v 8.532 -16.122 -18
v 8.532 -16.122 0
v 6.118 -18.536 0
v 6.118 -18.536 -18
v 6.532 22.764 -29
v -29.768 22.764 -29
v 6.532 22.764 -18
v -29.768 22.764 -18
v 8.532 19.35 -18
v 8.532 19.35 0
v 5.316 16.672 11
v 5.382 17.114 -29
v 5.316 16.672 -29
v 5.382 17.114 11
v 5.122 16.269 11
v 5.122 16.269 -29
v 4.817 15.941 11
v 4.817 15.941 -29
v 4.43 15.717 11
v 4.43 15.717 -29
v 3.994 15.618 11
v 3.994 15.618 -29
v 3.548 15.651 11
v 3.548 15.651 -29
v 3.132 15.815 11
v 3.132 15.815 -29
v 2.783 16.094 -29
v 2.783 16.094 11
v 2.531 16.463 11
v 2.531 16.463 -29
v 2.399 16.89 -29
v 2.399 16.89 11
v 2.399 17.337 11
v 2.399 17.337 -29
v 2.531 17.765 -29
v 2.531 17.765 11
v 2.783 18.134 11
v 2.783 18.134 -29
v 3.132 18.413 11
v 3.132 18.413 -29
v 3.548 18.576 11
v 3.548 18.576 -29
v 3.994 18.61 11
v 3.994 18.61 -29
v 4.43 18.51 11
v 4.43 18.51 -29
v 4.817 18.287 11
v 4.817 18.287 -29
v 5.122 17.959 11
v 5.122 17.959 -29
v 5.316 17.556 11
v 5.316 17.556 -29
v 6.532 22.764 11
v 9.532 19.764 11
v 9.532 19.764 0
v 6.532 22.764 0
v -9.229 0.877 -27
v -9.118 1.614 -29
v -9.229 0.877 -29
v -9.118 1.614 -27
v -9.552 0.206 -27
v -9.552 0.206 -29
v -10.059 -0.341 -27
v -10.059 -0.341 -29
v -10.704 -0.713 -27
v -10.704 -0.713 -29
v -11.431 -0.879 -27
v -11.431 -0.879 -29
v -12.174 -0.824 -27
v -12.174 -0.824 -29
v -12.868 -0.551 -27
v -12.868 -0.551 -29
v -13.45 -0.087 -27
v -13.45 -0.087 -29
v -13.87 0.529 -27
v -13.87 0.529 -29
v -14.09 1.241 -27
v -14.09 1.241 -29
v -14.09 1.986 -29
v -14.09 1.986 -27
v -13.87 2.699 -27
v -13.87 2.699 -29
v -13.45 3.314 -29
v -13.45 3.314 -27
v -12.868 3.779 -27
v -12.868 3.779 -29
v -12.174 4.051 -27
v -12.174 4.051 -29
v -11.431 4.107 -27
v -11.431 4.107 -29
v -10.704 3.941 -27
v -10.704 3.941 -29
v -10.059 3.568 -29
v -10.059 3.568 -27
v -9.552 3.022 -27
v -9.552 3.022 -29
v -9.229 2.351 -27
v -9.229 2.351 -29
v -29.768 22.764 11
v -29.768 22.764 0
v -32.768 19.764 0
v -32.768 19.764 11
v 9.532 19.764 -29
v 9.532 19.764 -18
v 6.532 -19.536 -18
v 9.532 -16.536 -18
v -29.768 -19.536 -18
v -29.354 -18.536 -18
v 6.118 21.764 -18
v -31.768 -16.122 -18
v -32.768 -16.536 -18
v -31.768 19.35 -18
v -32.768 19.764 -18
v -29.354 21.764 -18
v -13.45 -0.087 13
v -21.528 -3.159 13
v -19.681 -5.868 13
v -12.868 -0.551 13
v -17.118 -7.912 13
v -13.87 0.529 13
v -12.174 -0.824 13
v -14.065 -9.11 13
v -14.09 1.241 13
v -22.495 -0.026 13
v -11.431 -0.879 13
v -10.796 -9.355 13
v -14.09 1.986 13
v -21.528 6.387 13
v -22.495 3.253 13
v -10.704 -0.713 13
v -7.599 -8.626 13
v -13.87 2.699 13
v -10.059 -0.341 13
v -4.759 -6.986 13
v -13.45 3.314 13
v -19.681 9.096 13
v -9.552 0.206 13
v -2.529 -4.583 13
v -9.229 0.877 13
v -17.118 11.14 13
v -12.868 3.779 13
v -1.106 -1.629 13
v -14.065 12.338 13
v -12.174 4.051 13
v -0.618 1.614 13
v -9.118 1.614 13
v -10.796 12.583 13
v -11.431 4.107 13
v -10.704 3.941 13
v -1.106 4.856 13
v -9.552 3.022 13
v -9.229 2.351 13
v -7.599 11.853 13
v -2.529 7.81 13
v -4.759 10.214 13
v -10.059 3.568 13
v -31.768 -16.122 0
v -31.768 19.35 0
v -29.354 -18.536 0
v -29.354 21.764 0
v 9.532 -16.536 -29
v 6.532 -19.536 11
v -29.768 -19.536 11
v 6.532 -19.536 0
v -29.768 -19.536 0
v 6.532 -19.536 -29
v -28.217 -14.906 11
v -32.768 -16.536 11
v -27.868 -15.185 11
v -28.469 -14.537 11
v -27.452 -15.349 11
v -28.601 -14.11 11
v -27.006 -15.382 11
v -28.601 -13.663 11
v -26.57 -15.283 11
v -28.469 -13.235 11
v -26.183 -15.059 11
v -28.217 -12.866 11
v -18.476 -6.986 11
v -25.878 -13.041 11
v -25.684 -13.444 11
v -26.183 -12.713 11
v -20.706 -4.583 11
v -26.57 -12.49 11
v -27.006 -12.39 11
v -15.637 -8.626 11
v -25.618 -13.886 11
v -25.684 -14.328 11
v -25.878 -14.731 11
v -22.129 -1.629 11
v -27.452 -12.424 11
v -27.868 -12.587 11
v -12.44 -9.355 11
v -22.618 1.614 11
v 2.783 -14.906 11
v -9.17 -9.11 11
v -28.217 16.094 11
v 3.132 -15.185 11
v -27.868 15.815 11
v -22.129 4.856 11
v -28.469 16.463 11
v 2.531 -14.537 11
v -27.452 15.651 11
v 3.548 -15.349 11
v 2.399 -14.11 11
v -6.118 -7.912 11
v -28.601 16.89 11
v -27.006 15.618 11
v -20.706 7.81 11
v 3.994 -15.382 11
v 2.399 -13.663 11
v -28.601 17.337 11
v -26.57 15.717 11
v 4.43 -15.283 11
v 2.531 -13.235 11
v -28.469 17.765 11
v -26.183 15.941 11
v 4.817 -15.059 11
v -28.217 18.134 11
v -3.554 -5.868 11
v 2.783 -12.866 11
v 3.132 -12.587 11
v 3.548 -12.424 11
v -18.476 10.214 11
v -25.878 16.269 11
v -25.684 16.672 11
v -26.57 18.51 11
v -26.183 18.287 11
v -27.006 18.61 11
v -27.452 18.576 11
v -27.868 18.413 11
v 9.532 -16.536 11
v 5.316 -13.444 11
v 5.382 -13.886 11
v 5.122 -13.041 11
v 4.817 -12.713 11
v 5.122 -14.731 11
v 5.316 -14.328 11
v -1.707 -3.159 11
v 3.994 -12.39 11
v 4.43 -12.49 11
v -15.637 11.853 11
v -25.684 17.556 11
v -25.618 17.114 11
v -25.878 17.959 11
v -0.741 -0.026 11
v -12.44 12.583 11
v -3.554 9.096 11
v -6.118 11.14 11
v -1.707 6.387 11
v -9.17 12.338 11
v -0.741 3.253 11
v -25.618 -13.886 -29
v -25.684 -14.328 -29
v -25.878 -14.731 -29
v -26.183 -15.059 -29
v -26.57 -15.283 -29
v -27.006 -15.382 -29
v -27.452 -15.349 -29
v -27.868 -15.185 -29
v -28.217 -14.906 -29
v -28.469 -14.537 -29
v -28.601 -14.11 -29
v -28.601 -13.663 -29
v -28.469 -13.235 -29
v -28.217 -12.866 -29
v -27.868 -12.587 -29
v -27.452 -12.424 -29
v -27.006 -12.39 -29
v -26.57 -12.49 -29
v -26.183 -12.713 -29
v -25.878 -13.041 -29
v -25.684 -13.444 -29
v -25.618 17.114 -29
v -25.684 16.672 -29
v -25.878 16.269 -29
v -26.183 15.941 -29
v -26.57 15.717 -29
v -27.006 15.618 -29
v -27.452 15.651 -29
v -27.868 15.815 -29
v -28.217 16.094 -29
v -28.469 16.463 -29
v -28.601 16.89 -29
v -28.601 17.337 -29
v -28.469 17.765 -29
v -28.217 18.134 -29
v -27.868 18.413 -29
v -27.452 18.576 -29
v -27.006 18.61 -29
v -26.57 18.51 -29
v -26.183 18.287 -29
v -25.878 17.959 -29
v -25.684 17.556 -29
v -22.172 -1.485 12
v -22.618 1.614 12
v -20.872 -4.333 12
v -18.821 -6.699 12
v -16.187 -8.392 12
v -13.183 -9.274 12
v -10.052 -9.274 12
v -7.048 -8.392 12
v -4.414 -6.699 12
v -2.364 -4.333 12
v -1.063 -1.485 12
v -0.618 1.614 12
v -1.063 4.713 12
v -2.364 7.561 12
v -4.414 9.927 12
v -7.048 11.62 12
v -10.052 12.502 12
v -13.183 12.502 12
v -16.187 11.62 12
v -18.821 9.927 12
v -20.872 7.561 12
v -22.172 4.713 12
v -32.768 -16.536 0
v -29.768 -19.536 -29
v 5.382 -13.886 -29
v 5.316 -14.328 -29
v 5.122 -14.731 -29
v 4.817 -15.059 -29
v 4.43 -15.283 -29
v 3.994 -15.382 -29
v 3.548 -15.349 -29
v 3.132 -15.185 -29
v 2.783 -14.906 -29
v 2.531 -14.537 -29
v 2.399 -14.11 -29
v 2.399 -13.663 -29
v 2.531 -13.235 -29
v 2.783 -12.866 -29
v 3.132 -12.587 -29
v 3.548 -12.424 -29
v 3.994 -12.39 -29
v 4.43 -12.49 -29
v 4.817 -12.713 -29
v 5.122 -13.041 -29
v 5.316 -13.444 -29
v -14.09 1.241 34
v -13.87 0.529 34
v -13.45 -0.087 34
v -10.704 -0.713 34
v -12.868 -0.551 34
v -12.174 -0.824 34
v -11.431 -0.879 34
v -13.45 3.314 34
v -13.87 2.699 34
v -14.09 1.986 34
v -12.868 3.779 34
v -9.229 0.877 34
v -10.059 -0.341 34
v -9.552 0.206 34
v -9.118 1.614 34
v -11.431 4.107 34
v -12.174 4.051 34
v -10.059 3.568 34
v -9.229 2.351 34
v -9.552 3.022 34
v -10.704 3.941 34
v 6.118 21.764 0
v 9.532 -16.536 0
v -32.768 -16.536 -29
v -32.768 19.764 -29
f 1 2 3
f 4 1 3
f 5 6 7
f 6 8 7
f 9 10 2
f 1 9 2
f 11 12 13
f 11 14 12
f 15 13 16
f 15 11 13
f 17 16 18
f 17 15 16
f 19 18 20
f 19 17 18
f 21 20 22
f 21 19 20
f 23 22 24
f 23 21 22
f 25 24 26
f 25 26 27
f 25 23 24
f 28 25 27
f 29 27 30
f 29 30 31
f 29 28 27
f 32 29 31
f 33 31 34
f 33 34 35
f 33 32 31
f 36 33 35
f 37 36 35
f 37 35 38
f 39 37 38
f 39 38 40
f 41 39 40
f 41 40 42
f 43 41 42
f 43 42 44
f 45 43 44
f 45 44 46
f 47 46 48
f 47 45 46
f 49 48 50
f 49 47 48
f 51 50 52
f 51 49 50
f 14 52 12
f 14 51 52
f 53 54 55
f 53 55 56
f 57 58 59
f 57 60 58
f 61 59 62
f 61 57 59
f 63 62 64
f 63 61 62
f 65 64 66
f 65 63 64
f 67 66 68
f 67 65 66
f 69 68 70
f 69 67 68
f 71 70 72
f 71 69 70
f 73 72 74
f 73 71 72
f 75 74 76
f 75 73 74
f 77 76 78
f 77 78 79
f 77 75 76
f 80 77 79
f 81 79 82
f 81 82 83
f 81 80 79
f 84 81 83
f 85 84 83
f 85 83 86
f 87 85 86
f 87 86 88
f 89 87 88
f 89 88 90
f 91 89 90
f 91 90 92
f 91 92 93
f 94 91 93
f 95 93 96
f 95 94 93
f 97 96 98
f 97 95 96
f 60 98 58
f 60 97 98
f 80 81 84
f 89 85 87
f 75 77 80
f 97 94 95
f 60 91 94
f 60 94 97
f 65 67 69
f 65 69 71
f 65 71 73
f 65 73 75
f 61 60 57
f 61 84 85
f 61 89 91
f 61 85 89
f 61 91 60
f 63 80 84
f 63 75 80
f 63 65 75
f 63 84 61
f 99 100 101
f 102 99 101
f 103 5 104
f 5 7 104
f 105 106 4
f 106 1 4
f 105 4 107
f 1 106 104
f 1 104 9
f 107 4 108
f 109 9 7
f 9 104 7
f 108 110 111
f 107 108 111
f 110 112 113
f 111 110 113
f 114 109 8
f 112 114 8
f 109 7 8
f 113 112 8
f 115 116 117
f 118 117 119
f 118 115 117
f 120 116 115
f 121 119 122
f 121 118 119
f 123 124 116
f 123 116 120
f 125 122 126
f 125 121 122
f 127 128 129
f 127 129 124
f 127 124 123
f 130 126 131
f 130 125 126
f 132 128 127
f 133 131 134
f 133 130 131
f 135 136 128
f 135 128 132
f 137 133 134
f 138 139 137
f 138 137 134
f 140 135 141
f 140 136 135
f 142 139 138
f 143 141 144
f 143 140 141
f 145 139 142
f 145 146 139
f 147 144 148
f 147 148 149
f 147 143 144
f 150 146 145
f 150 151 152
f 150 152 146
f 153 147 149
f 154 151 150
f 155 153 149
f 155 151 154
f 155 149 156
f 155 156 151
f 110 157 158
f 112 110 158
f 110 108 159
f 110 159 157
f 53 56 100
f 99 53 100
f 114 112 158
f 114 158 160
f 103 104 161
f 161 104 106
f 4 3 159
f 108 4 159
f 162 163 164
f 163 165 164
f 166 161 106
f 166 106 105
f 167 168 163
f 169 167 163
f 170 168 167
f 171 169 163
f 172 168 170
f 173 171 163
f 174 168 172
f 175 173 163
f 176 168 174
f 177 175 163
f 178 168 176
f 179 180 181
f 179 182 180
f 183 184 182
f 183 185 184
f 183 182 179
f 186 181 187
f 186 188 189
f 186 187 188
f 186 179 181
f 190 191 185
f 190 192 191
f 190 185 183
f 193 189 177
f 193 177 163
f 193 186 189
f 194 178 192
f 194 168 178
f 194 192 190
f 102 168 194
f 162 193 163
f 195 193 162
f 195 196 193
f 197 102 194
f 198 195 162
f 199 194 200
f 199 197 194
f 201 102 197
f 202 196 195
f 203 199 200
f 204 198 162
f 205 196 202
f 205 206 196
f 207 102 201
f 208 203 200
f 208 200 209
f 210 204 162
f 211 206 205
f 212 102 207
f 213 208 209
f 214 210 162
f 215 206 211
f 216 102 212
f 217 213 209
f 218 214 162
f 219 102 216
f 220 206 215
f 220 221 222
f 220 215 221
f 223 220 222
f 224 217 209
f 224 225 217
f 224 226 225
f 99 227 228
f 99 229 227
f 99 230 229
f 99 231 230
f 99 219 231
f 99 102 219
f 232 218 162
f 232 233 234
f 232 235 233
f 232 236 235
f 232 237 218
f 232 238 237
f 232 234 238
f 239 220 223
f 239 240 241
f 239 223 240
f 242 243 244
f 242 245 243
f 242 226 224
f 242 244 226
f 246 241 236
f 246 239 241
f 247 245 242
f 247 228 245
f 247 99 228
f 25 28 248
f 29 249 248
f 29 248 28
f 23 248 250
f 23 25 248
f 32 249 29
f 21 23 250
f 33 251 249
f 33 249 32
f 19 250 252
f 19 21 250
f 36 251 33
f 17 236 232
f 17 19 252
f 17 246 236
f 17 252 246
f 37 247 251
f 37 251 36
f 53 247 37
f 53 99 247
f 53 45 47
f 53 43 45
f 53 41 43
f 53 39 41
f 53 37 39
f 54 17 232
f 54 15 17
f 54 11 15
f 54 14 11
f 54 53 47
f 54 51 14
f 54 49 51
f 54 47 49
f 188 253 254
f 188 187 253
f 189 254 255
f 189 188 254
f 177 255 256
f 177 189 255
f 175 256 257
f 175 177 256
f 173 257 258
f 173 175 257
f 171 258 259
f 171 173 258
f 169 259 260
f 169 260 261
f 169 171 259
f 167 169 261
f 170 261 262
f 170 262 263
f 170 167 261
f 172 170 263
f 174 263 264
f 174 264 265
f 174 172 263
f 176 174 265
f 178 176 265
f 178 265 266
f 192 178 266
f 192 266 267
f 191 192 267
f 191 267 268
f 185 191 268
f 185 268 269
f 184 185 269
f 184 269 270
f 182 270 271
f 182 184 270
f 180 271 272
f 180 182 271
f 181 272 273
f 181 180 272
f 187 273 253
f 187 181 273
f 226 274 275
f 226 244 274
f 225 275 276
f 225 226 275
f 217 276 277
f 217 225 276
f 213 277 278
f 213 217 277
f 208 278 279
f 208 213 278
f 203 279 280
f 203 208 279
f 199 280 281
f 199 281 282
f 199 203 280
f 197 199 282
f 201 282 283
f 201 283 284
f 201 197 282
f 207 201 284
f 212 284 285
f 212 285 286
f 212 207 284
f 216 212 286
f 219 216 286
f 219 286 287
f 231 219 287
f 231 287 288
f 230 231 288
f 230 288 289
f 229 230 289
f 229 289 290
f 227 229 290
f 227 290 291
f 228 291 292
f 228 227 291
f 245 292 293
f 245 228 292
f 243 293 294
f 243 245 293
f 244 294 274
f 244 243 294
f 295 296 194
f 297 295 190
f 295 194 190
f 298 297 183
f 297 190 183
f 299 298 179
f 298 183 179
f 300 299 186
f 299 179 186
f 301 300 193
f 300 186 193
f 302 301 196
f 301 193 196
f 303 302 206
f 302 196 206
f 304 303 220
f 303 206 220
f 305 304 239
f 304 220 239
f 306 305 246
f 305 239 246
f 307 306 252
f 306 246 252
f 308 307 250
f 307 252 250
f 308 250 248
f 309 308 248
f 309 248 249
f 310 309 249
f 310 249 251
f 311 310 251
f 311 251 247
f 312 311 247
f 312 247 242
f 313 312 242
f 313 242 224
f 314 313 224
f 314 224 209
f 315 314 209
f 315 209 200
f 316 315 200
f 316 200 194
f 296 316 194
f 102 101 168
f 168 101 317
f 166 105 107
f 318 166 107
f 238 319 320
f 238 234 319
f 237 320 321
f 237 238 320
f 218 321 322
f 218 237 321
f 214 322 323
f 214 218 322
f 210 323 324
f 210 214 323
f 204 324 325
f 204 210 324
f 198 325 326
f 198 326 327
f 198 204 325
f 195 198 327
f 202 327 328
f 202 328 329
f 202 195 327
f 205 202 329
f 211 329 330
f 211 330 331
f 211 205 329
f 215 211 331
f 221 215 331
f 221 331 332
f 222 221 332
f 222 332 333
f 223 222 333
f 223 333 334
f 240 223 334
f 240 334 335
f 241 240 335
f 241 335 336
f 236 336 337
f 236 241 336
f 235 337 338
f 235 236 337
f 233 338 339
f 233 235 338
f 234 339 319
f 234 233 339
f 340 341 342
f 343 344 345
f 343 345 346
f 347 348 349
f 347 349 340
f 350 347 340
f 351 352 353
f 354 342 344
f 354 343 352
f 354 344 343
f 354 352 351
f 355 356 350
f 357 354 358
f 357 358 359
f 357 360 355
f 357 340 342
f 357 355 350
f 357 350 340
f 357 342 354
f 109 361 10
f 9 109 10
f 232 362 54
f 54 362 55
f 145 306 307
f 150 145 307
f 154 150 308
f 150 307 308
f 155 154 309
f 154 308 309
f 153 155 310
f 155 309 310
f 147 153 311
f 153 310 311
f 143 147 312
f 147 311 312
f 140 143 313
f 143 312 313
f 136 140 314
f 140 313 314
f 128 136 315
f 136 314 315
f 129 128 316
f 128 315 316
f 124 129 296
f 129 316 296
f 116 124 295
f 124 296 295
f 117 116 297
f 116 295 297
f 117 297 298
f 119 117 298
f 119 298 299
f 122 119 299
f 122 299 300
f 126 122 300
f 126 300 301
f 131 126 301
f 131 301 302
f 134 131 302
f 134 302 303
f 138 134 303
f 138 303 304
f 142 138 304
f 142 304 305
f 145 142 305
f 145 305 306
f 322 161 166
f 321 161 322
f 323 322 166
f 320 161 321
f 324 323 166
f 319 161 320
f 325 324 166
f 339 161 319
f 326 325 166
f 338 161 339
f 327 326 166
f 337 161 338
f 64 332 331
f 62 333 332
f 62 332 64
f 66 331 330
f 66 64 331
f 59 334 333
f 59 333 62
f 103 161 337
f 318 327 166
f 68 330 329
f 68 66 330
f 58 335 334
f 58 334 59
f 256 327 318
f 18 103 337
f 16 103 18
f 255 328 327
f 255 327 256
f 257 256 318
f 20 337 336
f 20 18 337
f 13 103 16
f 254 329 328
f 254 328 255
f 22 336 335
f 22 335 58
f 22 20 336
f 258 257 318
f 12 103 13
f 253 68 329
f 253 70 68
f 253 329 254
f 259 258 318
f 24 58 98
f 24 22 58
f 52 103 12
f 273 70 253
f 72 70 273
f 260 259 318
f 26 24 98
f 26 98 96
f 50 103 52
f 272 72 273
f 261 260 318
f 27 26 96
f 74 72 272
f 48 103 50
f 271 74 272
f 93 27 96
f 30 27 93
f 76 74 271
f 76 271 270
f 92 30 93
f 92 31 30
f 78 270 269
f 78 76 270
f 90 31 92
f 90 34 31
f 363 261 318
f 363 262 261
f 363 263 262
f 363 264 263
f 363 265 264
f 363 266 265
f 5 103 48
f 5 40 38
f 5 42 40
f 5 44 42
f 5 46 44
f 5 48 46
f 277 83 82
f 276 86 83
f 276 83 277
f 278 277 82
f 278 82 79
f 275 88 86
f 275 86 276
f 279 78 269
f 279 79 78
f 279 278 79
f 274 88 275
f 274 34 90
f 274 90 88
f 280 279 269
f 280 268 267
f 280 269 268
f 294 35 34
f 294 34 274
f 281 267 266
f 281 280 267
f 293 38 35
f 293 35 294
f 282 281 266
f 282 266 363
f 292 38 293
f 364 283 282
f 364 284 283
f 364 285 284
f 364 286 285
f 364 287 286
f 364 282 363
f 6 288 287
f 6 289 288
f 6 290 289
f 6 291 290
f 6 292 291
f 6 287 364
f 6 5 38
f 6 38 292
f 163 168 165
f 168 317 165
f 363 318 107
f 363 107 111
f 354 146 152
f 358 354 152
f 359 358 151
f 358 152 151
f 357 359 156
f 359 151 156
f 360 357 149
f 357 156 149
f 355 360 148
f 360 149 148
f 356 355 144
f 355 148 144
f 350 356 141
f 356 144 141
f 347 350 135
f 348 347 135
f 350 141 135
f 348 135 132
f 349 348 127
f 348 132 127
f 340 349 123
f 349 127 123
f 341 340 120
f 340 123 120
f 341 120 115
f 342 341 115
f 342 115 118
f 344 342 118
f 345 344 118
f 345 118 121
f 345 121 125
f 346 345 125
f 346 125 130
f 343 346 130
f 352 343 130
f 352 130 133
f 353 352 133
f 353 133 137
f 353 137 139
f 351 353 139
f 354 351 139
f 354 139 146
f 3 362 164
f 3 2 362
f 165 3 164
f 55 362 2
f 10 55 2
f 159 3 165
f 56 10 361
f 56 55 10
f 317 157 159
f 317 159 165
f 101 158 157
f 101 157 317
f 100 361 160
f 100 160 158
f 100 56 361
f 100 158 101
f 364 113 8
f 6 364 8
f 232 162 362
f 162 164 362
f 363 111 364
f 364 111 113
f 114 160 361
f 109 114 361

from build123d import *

# Parameters (mm, degrees)
EXTRUDE_1_DEPTH     = 10
SKETCH_2_R          = 11
EXTRUDE_2_DEPTH     = 2
SKETCH_3_R          = 2.5
EXTRUDE_3_DEPTH     = 22
EXTRUDE_4_DEPTH     = 18
EXTRUDE_5_DEPTH     = 10
SKETCH_4_R          = 1.5
CUT_EXTRUDE_1_DEPTH = 46.5
SKETCH_5_R          = 2.5
CUT_EXTRUDE_2_DEPTH = 1
SKETCH_9_R          = 1.5
EXTRUDE_6_DEPTH     = 1
SKETCH_10_R         = 1.5
SKETCH_10_R_2       = 2.5
EXTRUDE_7_DEPTH     = 1
SKETCH_11_R         = 11
SKETCH_11_R_2       = 2.5
EXTRUDE_8_DEPTH     = 1


with BuildPart() as part:
    # Эскиз1 → Бобышка-Вытянуть1 (new body)
    with BuildSketch(Plane.XY):
        Polygon((-32.767753805, -16.536194896), (-32.767753805, 19.763805104), (-29.767753805, 22.763805104), (6.532246195, 22.763805104), (9.532246195, 19.763805104), (9.532246195, -16.536194896), (6.532246195, -19.536194896), (-29.767753805, -19.536194896), align=None)
    extrude(amount=EXTRUDE_1_DEPTH)

    # Эскиз2 → Бобышка-Вытянуть2 (add)
    with BuildSketch(Plane.XY.offset(10)):
        with Locations(Location((-11.617753805, 1.613805104, 0), (0, 0, 180))):
            Circle(SKETCH_2_R)
    extrude(amount=EXTRUDE_2_DEPTH)

    # Эскиз3 → Бобышка-Вытянуть3 (add)
    with BuildSketch(Plane.XY.offset(12)):
        with Locations((-11.617753805, 1.613805104)):
            Circle(SKETCH_3_R)
    extrude(amount=EXTRUDE_3_DEPTH)

    # Эскиз6 → Бобышка-Вытянуть4 (add)
    with BuildSketch(Plane(origin=(0, 0, 0), x_dir=(-1, 0, 0), z_dir=(0, 0, -1))):
        Polygon((11.617753805, 21.763805104), (-6.118032632, 21.763805104), (-8.532246195, 19.349591542), (-8.532246195, -16.121981333), (-6.118032632, -18.536194896), (29.353540243, -18.536194896), (31.767753805, -16.121981333), (31.767753805, 19.349591542), (29.353540243, 21.763805104), align=None)
    extrude(amount=EXTRUDE_4_DEPTH)

    # Эскиз7 → Бобышка-Вытянуть5 (add)
    with BuildSketch(Plane.XY.offset(-18)):
        Polygon((-32.767753805, -16.536194896), (-32.767753805, 19.763805104), (-29.767753805, 22.763805104), (6.532246195, 22.763805104), (9.532246195, 19.763805104), (9.532246195, -16.536194896), (6.532246195, -19.536194896), (-29.767753805, -19.536194896), align=None)
    extrude(amount=-EXTRUDE_5_DEPTH)

    # Эскиз4 → Вырез-Вытянуть1 (cut)
    with BuildSketch(Plane.XY.offset(10)):
        with Locations((-27.117753805, 17.113805104)):
            Circle(SKETCH_4_R)
        with Locations((3.882246195, 17.113805104)):
            Circle(SKETCH_4_R)
        with Locations((3.882246195, -13.886194896)):
            Circle(SKETCH_4_R)
        with Locations((-27.117753805, -13.886194896)):
            Circle(SKETCH_4_R)
    extrude(amount=-CUT_EXTRUDE_1_DEPTH, mode=Mode.SUBTRACT)

    # Эскиз5 → Вырез-Вытянуть2 (cut)
    with BuildSketch(Plane(origin=(0, 0, -28), x_dir=(-1, 0, 0), z_dir=(0, 0, -1))):
        with Locations(Location((11.617753805, 1.613805104, 0), (0, 0, 180))):
            Circle(SKETCH_5_R)
    extrude(amount=-CUT_EXTRUDE_2_DEPTH, mode=Mode.SUBTRACT)

    # Эскиз9 → Бобышка-Вытянуть6 (add)
    with BuildSketch(Plane.XY.offset(10)):
        Polygon((-29.767753805, 22.763805104), (-32.767753805, 19.763805104), (-32.767753805, -16.536194896), (-29.767753805, -19.536194896), (6.532246195, -19.536194896), (9.532246195, -16.536194896), (9.532246195, 19.763805104), (6.532246195, 22.763805104), align=None)
        with Locations((3.882246195, 17.113805104)):
            Circle(SKETCH_9_R, mode=Mode.SUBTRACT)
        with Locations((3.882246195, -13.886194896)):
            Circle(SKETCH_9_R, mode=Mode.SUBTRACT)
        with Locations((-27.117753805, -13.886194896)):
            Circle(SKETCH_9_R, mode=Mode.SUBTRACT)
        with Locations((-27.117753805, 17.113805104)):
            Circle(SKETCH_9_R, mode=Mode.SUBTRACT)
    extrude(amount=EXTRUDE_6_DEPTH)

    # Эскиз10 → Бобышка-Вытянуть7 (add)
    with BuildSketch(Plane(origin=(0, 0, -28), x_dir=(-1, 0, 0), z_dir=(0, 0, -1))):
        Polygon((32.767753805, 19.763805104), (29.767753805, 22.763805104), (-6.532246195, 22.763805104), (-9.532246195, 19.763805104), (-9.532246195, -16.536194896), (-6.532246195, -19.536194896), (29.767753805, -19.536194896), (32.767753805, -16.536194896), align=None)
        with Locations(Location((-3.882246195, -13.886194896, 0), (0, 0, 180))):
            Circle(SKETCH_10_R, mode=Mode.SUBTRACT)
        with Locations(Location((27.117753805, -13.886194896, 0), (0, 0, 180))):
            Circle(SKETCH_10_R, mode=Mode.SUBTRACT)
        with Locations(Location((11.617753805, 1.613805104, 0), (0, 0, 180))):
            Circle(SKETCH_10_R_2, mode=Mode.SUBTRACT)
        with Locations(Location((-3.882246195, 17.113805104, 0), (0, 0, 180))):
            Circle(SKETCH_10_R, mode=Mode.SUBTRACT)
        with Locations(Location((27.117753805, 17.113805104, 0), (0, 0, 180))):
            Circle(SKETCH_10_R, mode=Mode.SUBTRACT)
    extrude(amount=EXTRUDE_7_DEPTH)

    # Эскиз11 → Бобышка-Вытянуть8 (add)
    with BuildSketch(Plane.XY.offset(12)):
        with Locations((-11.617753805, 1.613805104)):
            Circle(SKETCH_11_R)
        with Locations(Location((-11.617753805, 1.613805104, 0), (0, 0, 180))):
            Circle(SKETCH_11_R_2, mode=Mode.SUBTRACT)
    extrude(amount=EXTRUDE_8_DEPTH)


solid = part.part
